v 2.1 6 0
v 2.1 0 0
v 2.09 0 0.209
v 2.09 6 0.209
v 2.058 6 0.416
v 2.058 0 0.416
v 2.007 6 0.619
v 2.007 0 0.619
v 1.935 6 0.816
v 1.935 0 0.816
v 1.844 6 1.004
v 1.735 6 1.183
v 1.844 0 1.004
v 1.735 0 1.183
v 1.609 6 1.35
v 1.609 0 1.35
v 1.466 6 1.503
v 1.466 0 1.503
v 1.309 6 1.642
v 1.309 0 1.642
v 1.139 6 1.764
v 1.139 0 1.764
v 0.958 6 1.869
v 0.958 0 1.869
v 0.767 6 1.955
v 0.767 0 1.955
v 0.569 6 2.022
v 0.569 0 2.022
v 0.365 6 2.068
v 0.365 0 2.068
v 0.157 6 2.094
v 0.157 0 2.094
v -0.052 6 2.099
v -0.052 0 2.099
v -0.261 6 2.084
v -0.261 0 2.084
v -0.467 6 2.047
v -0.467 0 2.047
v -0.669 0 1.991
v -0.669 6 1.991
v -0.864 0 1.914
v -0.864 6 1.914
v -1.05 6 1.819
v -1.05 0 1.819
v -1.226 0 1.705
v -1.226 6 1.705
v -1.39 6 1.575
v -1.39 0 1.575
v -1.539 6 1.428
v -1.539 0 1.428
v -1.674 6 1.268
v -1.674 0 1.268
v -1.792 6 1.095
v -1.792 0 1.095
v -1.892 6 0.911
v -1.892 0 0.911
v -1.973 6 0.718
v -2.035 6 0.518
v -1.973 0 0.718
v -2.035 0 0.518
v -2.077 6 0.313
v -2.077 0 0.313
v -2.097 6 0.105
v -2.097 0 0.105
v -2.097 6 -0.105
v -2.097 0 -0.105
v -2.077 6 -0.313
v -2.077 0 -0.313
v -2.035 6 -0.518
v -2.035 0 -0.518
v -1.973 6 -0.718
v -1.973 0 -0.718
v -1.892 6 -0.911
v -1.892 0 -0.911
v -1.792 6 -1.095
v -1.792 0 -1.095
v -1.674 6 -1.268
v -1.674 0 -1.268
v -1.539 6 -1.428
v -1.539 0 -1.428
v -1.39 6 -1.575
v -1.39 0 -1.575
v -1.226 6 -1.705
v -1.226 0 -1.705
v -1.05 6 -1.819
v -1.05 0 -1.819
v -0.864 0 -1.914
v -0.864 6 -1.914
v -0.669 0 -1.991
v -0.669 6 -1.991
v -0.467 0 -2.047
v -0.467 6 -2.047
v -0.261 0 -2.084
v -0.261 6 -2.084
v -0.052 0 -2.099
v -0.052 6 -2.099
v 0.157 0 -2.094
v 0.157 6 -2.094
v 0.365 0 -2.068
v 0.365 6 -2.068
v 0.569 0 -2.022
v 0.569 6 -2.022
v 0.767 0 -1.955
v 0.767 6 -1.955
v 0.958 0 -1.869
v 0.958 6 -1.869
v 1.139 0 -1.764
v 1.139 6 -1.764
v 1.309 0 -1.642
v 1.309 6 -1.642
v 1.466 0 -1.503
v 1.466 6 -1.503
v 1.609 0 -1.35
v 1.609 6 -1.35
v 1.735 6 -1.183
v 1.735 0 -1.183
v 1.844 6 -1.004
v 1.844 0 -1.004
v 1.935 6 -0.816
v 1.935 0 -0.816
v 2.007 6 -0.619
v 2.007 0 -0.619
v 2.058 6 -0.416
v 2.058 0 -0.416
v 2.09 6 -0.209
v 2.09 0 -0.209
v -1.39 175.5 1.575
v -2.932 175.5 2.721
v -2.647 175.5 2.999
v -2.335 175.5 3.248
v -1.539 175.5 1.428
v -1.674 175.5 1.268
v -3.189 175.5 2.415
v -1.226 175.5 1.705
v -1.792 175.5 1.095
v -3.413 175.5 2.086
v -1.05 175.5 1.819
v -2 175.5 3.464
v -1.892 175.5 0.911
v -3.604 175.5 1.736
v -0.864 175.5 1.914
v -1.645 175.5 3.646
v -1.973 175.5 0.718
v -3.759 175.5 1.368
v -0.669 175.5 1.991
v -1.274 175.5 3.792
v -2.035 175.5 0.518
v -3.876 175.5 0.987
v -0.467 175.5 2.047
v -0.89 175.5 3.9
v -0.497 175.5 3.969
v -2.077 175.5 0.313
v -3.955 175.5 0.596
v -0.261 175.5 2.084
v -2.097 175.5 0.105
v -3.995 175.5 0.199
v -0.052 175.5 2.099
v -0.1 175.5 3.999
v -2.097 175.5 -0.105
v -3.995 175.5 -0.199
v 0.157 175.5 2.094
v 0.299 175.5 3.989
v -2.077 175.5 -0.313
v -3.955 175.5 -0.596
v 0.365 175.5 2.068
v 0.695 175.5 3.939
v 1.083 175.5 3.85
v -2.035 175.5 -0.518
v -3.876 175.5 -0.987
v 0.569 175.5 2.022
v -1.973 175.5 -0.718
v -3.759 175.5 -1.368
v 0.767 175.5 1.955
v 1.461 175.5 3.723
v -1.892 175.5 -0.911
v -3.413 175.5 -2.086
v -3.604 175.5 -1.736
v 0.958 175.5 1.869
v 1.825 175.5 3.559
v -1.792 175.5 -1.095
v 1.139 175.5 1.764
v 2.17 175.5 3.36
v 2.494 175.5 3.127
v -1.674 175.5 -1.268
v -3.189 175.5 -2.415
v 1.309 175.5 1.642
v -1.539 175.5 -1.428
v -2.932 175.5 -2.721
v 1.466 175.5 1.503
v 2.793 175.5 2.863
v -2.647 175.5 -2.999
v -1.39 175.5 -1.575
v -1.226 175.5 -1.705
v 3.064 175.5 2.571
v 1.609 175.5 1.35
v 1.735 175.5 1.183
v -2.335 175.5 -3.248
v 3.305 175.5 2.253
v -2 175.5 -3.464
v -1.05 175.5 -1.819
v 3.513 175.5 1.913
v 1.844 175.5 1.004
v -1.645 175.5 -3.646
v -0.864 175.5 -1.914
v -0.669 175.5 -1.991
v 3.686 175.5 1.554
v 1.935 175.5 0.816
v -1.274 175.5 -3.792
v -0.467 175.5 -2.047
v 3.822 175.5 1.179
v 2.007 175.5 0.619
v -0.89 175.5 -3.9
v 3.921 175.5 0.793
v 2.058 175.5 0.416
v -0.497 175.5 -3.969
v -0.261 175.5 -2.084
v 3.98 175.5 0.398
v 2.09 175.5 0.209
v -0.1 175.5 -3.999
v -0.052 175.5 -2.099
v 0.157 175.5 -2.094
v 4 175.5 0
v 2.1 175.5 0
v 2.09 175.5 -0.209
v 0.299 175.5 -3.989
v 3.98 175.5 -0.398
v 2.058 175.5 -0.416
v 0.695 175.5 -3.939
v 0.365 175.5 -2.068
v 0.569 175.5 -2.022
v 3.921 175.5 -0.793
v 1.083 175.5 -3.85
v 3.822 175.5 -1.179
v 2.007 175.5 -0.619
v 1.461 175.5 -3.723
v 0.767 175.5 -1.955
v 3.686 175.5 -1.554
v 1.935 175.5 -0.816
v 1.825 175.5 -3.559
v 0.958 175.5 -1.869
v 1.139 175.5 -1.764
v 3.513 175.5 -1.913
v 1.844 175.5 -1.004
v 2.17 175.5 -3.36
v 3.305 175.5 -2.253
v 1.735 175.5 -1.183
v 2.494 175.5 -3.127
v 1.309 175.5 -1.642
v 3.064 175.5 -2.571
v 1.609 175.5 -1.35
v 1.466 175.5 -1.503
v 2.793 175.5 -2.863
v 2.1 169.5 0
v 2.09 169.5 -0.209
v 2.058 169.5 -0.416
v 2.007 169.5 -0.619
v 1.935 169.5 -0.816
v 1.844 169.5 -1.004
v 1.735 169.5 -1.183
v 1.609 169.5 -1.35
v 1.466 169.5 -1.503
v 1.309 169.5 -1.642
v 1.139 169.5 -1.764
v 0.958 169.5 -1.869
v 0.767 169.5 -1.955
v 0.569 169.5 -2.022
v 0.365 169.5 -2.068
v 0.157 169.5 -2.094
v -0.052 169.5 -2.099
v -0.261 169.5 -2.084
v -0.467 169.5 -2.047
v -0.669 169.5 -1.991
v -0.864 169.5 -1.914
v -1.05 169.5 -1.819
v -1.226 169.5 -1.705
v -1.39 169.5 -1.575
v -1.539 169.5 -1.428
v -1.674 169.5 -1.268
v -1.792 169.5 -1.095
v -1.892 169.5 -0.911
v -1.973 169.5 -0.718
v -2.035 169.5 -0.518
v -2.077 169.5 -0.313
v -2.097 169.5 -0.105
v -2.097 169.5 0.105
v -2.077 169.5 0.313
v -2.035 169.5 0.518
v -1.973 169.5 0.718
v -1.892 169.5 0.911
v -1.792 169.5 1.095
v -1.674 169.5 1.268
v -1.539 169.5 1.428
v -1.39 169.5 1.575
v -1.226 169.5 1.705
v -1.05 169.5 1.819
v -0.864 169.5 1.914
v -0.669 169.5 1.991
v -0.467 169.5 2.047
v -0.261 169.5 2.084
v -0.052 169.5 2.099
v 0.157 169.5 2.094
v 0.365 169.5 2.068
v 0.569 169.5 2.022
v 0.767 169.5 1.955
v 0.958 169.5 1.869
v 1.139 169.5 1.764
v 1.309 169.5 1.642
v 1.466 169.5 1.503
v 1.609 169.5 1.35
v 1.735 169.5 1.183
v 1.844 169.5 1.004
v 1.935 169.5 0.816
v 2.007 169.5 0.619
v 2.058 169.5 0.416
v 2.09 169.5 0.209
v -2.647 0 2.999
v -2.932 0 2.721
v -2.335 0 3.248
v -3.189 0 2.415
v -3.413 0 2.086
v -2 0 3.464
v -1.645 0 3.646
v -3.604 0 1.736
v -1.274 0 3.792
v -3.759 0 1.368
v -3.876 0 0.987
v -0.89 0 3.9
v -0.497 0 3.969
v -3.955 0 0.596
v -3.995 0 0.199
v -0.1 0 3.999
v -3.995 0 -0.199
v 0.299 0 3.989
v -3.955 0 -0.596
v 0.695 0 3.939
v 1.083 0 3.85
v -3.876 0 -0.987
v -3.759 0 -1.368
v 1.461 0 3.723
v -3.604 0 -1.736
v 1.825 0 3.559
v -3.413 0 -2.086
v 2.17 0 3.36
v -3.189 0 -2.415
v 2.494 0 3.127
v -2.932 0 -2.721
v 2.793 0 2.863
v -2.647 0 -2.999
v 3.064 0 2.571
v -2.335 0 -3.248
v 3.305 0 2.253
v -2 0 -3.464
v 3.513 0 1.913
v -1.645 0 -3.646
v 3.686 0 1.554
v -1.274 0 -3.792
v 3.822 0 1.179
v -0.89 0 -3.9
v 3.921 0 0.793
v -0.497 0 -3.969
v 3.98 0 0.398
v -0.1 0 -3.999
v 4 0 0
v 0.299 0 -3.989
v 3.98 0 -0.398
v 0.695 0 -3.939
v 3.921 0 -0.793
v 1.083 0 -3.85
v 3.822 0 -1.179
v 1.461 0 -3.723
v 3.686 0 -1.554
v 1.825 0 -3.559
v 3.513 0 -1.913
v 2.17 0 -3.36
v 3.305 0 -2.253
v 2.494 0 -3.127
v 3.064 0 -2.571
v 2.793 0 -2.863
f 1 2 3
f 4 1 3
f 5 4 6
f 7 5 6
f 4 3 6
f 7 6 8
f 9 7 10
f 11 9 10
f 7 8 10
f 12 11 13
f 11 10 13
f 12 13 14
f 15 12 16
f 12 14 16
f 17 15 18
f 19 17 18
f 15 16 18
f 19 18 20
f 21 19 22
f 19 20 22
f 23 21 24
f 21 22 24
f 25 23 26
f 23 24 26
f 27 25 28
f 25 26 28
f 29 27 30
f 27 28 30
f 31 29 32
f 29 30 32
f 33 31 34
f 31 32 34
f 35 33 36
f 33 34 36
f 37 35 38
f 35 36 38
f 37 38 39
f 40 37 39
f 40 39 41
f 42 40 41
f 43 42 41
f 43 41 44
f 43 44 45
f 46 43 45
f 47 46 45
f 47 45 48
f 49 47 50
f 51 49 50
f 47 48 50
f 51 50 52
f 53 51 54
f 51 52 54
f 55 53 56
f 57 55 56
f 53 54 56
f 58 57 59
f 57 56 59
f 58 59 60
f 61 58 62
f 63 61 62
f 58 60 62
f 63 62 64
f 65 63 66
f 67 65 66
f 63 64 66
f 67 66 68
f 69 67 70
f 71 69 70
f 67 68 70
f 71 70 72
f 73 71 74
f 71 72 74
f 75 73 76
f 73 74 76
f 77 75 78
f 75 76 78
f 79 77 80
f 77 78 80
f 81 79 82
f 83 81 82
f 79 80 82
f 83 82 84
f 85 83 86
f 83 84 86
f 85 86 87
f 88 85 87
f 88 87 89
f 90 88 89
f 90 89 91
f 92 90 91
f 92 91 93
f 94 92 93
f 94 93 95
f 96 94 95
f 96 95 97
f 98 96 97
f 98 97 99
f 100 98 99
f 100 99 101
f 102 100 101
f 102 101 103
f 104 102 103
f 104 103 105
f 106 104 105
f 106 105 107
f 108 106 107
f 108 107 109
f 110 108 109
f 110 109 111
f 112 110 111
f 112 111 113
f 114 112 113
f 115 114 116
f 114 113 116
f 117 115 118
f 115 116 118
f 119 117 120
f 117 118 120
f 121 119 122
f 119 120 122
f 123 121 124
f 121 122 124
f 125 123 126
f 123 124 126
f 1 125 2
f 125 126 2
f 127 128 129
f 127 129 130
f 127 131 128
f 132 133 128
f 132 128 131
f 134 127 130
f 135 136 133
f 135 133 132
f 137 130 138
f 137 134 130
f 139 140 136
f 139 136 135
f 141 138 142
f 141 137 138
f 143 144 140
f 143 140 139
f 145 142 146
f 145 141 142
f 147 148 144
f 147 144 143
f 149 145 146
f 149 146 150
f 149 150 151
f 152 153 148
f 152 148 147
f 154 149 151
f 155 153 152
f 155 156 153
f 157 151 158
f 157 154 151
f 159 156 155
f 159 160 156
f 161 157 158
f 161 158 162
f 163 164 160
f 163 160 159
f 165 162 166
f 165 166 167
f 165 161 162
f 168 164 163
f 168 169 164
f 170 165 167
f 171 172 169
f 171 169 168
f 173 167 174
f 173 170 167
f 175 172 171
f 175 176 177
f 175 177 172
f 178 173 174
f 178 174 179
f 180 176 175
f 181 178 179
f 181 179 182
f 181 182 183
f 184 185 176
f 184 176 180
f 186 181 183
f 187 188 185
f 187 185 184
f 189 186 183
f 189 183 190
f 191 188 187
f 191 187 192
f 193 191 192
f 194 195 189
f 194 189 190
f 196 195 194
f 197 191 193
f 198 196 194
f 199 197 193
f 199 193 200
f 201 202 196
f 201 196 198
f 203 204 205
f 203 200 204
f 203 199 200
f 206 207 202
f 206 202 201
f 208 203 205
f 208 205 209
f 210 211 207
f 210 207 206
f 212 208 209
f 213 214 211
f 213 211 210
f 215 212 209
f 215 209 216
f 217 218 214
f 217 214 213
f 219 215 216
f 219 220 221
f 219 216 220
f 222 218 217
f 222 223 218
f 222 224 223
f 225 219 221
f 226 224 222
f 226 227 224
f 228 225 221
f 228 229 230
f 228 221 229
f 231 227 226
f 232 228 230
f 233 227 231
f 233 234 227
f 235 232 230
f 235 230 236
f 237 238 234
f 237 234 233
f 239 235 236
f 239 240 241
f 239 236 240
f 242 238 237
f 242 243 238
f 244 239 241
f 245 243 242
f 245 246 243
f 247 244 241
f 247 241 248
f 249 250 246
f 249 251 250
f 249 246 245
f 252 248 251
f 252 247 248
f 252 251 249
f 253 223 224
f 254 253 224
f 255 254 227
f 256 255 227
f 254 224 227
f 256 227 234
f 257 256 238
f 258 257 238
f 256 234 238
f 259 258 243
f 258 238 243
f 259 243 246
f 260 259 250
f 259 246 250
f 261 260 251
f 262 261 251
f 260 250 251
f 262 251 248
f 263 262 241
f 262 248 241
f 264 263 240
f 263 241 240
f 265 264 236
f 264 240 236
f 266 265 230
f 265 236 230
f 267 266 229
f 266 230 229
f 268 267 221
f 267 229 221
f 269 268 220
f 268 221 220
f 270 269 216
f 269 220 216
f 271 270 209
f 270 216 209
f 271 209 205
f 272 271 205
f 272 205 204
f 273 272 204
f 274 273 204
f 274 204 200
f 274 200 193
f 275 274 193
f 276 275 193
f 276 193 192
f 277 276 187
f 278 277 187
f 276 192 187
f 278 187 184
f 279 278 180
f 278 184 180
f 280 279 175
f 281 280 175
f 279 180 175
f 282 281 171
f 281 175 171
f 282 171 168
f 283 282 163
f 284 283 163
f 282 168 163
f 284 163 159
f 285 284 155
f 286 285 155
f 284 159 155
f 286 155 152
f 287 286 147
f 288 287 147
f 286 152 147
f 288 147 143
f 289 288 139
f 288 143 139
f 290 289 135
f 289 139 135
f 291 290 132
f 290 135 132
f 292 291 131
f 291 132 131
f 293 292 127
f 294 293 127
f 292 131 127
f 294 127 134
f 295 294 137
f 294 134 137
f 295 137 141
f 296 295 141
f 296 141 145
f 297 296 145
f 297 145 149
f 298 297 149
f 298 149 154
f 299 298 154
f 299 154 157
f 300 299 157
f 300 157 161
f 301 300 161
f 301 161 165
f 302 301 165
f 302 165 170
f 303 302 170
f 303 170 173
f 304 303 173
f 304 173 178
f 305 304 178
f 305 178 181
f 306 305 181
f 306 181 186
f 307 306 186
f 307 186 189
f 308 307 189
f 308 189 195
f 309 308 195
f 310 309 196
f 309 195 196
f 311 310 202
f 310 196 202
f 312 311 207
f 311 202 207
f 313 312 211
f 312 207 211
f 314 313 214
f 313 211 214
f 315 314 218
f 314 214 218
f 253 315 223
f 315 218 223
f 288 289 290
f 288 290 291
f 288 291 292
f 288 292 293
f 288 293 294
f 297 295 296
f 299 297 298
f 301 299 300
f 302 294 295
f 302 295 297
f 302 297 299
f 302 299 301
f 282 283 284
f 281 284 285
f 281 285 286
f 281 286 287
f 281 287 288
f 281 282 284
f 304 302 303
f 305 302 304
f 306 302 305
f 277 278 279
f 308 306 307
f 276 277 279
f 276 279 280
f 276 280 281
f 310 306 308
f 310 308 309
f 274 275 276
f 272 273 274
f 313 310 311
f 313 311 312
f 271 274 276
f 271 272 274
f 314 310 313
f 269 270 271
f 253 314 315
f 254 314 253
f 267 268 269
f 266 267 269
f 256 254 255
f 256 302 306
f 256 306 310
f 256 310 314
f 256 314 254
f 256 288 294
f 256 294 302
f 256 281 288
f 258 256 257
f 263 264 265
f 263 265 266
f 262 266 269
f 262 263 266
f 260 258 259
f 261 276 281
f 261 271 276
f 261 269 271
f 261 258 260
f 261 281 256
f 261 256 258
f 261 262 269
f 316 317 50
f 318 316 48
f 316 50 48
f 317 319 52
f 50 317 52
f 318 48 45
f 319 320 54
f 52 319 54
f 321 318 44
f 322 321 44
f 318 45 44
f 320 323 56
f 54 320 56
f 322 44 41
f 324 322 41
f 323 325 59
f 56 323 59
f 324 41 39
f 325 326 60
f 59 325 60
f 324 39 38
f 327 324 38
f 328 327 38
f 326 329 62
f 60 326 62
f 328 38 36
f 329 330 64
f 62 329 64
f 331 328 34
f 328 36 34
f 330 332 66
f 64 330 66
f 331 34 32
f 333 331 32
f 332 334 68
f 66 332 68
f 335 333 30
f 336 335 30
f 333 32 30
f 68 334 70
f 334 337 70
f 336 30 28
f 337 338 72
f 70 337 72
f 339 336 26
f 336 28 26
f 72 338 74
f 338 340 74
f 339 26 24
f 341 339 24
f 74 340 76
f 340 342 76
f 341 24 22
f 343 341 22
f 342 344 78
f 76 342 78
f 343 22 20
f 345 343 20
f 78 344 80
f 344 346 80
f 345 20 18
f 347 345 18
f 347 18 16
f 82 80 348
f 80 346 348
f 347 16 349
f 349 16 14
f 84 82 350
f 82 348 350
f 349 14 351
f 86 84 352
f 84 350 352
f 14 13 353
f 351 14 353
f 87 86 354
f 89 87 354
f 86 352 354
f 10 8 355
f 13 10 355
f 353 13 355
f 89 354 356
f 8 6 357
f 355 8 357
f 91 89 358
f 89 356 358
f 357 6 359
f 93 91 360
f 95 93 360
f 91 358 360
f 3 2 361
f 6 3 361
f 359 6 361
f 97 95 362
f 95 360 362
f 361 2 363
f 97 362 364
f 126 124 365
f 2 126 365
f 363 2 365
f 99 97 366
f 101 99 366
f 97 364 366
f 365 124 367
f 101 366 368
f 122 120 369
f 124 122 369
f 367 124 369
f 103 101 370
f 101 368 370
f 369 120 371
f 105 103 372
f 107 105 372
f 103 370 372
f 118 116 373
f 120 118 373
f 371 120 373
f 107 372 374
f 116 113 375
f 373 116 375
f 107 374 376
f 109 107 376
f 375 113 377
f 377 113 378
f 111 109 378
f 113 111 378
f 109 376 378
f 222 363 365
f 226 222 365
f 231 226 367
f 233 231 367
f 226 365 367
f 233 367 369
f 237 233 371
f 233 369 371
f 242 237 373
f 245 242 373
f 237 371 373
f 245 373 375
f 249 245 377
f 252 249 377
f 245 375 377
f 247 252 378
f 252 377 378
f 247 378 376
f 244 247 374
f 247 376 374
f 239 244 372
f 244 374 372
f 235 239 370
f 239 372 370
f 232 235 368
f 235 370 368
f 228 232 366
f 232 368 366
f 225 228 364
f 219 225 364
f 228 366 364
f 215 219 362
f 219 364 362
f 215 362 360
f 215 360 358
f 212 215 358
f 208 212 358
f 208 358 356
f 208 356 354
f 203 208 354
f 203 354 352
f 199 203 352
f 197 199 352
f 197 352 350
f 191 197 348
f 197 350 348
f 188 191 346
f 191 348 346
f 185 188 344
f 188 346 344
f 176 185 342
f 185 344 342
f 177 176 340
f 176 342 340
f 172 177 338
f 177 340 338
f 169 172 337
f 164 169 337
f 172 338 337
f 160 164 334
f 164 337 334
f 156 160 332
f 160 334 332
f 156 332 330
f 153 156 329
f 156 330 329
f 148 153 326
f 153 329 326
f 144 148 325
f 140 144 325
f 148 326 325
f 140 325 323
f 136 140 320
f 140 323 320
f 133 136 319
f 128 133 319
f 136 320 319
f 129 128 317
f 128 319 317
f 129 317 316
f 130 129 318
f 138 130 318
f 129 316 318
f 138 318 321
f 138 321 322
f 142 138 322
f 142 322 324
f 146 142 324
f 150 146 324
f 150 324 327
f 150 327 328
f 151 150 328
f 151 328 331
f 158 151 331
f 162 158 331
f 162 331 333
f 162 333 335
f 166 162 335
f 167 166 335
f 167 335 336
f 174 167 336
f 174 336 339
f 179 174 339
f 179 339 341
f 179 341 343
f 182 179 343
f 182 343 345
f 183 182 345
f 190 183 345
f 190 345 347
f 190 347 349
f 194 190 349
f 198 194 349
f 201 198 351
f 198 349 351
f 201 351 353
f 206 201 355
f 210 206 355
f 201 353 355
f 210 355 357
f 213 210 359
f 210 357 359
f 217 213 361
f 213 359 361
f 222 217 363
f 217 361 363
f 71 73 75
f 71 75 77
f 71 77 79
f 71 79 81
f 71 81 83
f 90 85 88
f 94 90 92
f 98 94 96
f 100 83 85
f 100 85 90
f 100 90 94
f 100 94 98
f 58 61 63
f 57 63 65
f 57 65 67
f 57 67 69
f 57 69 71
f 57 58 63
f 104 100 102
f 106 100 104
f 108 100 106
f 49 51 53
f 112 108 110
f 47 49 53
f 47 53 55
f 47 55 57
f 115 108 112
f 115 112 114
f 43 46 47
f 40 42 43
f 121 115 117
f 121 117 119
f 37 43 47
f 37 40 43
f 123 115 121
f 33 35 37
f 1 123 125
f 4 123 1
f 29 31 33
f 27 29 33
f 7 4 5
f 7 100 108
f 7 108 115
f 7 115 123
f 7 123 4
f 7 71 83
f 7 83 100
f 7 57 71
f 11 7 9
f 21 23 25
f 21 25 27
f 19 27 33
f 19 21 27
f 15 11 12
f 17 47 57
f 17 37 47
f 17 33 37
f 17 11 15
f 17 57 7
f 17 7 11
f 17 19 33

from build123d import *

# Parameters (mm, degrees)
SKETCH_1_R          = 4
EXTRUDE_1_DEPTH     = 175.5
SKETCH_2_R          = 2.1
CUT_EXTRUDE_1_DEPTH = 6
SKETCH_3_R          = 2.1
CUT_EXTRUDE_2_DEPTH = 6


with BuildPart() as part:
    # ｽｹｯﾁ1 → ﾎﾞｽ - 押し出し1 (new body)
    with BuildSketch(Plane(origin=(0, 0, 0), x_dir=(1, 0, 0), z_dir=(0, 1, 0))):
        Circle(SKETCH_1_R)
    extrude(amount=EXTRUDE_1_DEPTH)

    # ｽｹｯﾁ2 → ｶｯﾄ - 押し出し1 (cut)
    with BuildSketch(Plane(origin=(0, 175.5, 0), x_dir=(1, 0, 0), z_dir=(0, 1, 0))):
        Circle(SKETCH_2_R)
    extrude(amount=-CUT_EXTRUDE_1_DEPTH, mode=Mode.SUBTRACT)

    # ｽｹｯﾁ3 → ｶｯﾄ - 押し出し2 (cut)
    with BuildSketch(Plane.XZ):
        Circle(SKETCH_3_R)
    extrude(amount=-CUT_EXTRUDE_2_DEPTH, mode=Mode.SUBTRACT)


solid = part.part
